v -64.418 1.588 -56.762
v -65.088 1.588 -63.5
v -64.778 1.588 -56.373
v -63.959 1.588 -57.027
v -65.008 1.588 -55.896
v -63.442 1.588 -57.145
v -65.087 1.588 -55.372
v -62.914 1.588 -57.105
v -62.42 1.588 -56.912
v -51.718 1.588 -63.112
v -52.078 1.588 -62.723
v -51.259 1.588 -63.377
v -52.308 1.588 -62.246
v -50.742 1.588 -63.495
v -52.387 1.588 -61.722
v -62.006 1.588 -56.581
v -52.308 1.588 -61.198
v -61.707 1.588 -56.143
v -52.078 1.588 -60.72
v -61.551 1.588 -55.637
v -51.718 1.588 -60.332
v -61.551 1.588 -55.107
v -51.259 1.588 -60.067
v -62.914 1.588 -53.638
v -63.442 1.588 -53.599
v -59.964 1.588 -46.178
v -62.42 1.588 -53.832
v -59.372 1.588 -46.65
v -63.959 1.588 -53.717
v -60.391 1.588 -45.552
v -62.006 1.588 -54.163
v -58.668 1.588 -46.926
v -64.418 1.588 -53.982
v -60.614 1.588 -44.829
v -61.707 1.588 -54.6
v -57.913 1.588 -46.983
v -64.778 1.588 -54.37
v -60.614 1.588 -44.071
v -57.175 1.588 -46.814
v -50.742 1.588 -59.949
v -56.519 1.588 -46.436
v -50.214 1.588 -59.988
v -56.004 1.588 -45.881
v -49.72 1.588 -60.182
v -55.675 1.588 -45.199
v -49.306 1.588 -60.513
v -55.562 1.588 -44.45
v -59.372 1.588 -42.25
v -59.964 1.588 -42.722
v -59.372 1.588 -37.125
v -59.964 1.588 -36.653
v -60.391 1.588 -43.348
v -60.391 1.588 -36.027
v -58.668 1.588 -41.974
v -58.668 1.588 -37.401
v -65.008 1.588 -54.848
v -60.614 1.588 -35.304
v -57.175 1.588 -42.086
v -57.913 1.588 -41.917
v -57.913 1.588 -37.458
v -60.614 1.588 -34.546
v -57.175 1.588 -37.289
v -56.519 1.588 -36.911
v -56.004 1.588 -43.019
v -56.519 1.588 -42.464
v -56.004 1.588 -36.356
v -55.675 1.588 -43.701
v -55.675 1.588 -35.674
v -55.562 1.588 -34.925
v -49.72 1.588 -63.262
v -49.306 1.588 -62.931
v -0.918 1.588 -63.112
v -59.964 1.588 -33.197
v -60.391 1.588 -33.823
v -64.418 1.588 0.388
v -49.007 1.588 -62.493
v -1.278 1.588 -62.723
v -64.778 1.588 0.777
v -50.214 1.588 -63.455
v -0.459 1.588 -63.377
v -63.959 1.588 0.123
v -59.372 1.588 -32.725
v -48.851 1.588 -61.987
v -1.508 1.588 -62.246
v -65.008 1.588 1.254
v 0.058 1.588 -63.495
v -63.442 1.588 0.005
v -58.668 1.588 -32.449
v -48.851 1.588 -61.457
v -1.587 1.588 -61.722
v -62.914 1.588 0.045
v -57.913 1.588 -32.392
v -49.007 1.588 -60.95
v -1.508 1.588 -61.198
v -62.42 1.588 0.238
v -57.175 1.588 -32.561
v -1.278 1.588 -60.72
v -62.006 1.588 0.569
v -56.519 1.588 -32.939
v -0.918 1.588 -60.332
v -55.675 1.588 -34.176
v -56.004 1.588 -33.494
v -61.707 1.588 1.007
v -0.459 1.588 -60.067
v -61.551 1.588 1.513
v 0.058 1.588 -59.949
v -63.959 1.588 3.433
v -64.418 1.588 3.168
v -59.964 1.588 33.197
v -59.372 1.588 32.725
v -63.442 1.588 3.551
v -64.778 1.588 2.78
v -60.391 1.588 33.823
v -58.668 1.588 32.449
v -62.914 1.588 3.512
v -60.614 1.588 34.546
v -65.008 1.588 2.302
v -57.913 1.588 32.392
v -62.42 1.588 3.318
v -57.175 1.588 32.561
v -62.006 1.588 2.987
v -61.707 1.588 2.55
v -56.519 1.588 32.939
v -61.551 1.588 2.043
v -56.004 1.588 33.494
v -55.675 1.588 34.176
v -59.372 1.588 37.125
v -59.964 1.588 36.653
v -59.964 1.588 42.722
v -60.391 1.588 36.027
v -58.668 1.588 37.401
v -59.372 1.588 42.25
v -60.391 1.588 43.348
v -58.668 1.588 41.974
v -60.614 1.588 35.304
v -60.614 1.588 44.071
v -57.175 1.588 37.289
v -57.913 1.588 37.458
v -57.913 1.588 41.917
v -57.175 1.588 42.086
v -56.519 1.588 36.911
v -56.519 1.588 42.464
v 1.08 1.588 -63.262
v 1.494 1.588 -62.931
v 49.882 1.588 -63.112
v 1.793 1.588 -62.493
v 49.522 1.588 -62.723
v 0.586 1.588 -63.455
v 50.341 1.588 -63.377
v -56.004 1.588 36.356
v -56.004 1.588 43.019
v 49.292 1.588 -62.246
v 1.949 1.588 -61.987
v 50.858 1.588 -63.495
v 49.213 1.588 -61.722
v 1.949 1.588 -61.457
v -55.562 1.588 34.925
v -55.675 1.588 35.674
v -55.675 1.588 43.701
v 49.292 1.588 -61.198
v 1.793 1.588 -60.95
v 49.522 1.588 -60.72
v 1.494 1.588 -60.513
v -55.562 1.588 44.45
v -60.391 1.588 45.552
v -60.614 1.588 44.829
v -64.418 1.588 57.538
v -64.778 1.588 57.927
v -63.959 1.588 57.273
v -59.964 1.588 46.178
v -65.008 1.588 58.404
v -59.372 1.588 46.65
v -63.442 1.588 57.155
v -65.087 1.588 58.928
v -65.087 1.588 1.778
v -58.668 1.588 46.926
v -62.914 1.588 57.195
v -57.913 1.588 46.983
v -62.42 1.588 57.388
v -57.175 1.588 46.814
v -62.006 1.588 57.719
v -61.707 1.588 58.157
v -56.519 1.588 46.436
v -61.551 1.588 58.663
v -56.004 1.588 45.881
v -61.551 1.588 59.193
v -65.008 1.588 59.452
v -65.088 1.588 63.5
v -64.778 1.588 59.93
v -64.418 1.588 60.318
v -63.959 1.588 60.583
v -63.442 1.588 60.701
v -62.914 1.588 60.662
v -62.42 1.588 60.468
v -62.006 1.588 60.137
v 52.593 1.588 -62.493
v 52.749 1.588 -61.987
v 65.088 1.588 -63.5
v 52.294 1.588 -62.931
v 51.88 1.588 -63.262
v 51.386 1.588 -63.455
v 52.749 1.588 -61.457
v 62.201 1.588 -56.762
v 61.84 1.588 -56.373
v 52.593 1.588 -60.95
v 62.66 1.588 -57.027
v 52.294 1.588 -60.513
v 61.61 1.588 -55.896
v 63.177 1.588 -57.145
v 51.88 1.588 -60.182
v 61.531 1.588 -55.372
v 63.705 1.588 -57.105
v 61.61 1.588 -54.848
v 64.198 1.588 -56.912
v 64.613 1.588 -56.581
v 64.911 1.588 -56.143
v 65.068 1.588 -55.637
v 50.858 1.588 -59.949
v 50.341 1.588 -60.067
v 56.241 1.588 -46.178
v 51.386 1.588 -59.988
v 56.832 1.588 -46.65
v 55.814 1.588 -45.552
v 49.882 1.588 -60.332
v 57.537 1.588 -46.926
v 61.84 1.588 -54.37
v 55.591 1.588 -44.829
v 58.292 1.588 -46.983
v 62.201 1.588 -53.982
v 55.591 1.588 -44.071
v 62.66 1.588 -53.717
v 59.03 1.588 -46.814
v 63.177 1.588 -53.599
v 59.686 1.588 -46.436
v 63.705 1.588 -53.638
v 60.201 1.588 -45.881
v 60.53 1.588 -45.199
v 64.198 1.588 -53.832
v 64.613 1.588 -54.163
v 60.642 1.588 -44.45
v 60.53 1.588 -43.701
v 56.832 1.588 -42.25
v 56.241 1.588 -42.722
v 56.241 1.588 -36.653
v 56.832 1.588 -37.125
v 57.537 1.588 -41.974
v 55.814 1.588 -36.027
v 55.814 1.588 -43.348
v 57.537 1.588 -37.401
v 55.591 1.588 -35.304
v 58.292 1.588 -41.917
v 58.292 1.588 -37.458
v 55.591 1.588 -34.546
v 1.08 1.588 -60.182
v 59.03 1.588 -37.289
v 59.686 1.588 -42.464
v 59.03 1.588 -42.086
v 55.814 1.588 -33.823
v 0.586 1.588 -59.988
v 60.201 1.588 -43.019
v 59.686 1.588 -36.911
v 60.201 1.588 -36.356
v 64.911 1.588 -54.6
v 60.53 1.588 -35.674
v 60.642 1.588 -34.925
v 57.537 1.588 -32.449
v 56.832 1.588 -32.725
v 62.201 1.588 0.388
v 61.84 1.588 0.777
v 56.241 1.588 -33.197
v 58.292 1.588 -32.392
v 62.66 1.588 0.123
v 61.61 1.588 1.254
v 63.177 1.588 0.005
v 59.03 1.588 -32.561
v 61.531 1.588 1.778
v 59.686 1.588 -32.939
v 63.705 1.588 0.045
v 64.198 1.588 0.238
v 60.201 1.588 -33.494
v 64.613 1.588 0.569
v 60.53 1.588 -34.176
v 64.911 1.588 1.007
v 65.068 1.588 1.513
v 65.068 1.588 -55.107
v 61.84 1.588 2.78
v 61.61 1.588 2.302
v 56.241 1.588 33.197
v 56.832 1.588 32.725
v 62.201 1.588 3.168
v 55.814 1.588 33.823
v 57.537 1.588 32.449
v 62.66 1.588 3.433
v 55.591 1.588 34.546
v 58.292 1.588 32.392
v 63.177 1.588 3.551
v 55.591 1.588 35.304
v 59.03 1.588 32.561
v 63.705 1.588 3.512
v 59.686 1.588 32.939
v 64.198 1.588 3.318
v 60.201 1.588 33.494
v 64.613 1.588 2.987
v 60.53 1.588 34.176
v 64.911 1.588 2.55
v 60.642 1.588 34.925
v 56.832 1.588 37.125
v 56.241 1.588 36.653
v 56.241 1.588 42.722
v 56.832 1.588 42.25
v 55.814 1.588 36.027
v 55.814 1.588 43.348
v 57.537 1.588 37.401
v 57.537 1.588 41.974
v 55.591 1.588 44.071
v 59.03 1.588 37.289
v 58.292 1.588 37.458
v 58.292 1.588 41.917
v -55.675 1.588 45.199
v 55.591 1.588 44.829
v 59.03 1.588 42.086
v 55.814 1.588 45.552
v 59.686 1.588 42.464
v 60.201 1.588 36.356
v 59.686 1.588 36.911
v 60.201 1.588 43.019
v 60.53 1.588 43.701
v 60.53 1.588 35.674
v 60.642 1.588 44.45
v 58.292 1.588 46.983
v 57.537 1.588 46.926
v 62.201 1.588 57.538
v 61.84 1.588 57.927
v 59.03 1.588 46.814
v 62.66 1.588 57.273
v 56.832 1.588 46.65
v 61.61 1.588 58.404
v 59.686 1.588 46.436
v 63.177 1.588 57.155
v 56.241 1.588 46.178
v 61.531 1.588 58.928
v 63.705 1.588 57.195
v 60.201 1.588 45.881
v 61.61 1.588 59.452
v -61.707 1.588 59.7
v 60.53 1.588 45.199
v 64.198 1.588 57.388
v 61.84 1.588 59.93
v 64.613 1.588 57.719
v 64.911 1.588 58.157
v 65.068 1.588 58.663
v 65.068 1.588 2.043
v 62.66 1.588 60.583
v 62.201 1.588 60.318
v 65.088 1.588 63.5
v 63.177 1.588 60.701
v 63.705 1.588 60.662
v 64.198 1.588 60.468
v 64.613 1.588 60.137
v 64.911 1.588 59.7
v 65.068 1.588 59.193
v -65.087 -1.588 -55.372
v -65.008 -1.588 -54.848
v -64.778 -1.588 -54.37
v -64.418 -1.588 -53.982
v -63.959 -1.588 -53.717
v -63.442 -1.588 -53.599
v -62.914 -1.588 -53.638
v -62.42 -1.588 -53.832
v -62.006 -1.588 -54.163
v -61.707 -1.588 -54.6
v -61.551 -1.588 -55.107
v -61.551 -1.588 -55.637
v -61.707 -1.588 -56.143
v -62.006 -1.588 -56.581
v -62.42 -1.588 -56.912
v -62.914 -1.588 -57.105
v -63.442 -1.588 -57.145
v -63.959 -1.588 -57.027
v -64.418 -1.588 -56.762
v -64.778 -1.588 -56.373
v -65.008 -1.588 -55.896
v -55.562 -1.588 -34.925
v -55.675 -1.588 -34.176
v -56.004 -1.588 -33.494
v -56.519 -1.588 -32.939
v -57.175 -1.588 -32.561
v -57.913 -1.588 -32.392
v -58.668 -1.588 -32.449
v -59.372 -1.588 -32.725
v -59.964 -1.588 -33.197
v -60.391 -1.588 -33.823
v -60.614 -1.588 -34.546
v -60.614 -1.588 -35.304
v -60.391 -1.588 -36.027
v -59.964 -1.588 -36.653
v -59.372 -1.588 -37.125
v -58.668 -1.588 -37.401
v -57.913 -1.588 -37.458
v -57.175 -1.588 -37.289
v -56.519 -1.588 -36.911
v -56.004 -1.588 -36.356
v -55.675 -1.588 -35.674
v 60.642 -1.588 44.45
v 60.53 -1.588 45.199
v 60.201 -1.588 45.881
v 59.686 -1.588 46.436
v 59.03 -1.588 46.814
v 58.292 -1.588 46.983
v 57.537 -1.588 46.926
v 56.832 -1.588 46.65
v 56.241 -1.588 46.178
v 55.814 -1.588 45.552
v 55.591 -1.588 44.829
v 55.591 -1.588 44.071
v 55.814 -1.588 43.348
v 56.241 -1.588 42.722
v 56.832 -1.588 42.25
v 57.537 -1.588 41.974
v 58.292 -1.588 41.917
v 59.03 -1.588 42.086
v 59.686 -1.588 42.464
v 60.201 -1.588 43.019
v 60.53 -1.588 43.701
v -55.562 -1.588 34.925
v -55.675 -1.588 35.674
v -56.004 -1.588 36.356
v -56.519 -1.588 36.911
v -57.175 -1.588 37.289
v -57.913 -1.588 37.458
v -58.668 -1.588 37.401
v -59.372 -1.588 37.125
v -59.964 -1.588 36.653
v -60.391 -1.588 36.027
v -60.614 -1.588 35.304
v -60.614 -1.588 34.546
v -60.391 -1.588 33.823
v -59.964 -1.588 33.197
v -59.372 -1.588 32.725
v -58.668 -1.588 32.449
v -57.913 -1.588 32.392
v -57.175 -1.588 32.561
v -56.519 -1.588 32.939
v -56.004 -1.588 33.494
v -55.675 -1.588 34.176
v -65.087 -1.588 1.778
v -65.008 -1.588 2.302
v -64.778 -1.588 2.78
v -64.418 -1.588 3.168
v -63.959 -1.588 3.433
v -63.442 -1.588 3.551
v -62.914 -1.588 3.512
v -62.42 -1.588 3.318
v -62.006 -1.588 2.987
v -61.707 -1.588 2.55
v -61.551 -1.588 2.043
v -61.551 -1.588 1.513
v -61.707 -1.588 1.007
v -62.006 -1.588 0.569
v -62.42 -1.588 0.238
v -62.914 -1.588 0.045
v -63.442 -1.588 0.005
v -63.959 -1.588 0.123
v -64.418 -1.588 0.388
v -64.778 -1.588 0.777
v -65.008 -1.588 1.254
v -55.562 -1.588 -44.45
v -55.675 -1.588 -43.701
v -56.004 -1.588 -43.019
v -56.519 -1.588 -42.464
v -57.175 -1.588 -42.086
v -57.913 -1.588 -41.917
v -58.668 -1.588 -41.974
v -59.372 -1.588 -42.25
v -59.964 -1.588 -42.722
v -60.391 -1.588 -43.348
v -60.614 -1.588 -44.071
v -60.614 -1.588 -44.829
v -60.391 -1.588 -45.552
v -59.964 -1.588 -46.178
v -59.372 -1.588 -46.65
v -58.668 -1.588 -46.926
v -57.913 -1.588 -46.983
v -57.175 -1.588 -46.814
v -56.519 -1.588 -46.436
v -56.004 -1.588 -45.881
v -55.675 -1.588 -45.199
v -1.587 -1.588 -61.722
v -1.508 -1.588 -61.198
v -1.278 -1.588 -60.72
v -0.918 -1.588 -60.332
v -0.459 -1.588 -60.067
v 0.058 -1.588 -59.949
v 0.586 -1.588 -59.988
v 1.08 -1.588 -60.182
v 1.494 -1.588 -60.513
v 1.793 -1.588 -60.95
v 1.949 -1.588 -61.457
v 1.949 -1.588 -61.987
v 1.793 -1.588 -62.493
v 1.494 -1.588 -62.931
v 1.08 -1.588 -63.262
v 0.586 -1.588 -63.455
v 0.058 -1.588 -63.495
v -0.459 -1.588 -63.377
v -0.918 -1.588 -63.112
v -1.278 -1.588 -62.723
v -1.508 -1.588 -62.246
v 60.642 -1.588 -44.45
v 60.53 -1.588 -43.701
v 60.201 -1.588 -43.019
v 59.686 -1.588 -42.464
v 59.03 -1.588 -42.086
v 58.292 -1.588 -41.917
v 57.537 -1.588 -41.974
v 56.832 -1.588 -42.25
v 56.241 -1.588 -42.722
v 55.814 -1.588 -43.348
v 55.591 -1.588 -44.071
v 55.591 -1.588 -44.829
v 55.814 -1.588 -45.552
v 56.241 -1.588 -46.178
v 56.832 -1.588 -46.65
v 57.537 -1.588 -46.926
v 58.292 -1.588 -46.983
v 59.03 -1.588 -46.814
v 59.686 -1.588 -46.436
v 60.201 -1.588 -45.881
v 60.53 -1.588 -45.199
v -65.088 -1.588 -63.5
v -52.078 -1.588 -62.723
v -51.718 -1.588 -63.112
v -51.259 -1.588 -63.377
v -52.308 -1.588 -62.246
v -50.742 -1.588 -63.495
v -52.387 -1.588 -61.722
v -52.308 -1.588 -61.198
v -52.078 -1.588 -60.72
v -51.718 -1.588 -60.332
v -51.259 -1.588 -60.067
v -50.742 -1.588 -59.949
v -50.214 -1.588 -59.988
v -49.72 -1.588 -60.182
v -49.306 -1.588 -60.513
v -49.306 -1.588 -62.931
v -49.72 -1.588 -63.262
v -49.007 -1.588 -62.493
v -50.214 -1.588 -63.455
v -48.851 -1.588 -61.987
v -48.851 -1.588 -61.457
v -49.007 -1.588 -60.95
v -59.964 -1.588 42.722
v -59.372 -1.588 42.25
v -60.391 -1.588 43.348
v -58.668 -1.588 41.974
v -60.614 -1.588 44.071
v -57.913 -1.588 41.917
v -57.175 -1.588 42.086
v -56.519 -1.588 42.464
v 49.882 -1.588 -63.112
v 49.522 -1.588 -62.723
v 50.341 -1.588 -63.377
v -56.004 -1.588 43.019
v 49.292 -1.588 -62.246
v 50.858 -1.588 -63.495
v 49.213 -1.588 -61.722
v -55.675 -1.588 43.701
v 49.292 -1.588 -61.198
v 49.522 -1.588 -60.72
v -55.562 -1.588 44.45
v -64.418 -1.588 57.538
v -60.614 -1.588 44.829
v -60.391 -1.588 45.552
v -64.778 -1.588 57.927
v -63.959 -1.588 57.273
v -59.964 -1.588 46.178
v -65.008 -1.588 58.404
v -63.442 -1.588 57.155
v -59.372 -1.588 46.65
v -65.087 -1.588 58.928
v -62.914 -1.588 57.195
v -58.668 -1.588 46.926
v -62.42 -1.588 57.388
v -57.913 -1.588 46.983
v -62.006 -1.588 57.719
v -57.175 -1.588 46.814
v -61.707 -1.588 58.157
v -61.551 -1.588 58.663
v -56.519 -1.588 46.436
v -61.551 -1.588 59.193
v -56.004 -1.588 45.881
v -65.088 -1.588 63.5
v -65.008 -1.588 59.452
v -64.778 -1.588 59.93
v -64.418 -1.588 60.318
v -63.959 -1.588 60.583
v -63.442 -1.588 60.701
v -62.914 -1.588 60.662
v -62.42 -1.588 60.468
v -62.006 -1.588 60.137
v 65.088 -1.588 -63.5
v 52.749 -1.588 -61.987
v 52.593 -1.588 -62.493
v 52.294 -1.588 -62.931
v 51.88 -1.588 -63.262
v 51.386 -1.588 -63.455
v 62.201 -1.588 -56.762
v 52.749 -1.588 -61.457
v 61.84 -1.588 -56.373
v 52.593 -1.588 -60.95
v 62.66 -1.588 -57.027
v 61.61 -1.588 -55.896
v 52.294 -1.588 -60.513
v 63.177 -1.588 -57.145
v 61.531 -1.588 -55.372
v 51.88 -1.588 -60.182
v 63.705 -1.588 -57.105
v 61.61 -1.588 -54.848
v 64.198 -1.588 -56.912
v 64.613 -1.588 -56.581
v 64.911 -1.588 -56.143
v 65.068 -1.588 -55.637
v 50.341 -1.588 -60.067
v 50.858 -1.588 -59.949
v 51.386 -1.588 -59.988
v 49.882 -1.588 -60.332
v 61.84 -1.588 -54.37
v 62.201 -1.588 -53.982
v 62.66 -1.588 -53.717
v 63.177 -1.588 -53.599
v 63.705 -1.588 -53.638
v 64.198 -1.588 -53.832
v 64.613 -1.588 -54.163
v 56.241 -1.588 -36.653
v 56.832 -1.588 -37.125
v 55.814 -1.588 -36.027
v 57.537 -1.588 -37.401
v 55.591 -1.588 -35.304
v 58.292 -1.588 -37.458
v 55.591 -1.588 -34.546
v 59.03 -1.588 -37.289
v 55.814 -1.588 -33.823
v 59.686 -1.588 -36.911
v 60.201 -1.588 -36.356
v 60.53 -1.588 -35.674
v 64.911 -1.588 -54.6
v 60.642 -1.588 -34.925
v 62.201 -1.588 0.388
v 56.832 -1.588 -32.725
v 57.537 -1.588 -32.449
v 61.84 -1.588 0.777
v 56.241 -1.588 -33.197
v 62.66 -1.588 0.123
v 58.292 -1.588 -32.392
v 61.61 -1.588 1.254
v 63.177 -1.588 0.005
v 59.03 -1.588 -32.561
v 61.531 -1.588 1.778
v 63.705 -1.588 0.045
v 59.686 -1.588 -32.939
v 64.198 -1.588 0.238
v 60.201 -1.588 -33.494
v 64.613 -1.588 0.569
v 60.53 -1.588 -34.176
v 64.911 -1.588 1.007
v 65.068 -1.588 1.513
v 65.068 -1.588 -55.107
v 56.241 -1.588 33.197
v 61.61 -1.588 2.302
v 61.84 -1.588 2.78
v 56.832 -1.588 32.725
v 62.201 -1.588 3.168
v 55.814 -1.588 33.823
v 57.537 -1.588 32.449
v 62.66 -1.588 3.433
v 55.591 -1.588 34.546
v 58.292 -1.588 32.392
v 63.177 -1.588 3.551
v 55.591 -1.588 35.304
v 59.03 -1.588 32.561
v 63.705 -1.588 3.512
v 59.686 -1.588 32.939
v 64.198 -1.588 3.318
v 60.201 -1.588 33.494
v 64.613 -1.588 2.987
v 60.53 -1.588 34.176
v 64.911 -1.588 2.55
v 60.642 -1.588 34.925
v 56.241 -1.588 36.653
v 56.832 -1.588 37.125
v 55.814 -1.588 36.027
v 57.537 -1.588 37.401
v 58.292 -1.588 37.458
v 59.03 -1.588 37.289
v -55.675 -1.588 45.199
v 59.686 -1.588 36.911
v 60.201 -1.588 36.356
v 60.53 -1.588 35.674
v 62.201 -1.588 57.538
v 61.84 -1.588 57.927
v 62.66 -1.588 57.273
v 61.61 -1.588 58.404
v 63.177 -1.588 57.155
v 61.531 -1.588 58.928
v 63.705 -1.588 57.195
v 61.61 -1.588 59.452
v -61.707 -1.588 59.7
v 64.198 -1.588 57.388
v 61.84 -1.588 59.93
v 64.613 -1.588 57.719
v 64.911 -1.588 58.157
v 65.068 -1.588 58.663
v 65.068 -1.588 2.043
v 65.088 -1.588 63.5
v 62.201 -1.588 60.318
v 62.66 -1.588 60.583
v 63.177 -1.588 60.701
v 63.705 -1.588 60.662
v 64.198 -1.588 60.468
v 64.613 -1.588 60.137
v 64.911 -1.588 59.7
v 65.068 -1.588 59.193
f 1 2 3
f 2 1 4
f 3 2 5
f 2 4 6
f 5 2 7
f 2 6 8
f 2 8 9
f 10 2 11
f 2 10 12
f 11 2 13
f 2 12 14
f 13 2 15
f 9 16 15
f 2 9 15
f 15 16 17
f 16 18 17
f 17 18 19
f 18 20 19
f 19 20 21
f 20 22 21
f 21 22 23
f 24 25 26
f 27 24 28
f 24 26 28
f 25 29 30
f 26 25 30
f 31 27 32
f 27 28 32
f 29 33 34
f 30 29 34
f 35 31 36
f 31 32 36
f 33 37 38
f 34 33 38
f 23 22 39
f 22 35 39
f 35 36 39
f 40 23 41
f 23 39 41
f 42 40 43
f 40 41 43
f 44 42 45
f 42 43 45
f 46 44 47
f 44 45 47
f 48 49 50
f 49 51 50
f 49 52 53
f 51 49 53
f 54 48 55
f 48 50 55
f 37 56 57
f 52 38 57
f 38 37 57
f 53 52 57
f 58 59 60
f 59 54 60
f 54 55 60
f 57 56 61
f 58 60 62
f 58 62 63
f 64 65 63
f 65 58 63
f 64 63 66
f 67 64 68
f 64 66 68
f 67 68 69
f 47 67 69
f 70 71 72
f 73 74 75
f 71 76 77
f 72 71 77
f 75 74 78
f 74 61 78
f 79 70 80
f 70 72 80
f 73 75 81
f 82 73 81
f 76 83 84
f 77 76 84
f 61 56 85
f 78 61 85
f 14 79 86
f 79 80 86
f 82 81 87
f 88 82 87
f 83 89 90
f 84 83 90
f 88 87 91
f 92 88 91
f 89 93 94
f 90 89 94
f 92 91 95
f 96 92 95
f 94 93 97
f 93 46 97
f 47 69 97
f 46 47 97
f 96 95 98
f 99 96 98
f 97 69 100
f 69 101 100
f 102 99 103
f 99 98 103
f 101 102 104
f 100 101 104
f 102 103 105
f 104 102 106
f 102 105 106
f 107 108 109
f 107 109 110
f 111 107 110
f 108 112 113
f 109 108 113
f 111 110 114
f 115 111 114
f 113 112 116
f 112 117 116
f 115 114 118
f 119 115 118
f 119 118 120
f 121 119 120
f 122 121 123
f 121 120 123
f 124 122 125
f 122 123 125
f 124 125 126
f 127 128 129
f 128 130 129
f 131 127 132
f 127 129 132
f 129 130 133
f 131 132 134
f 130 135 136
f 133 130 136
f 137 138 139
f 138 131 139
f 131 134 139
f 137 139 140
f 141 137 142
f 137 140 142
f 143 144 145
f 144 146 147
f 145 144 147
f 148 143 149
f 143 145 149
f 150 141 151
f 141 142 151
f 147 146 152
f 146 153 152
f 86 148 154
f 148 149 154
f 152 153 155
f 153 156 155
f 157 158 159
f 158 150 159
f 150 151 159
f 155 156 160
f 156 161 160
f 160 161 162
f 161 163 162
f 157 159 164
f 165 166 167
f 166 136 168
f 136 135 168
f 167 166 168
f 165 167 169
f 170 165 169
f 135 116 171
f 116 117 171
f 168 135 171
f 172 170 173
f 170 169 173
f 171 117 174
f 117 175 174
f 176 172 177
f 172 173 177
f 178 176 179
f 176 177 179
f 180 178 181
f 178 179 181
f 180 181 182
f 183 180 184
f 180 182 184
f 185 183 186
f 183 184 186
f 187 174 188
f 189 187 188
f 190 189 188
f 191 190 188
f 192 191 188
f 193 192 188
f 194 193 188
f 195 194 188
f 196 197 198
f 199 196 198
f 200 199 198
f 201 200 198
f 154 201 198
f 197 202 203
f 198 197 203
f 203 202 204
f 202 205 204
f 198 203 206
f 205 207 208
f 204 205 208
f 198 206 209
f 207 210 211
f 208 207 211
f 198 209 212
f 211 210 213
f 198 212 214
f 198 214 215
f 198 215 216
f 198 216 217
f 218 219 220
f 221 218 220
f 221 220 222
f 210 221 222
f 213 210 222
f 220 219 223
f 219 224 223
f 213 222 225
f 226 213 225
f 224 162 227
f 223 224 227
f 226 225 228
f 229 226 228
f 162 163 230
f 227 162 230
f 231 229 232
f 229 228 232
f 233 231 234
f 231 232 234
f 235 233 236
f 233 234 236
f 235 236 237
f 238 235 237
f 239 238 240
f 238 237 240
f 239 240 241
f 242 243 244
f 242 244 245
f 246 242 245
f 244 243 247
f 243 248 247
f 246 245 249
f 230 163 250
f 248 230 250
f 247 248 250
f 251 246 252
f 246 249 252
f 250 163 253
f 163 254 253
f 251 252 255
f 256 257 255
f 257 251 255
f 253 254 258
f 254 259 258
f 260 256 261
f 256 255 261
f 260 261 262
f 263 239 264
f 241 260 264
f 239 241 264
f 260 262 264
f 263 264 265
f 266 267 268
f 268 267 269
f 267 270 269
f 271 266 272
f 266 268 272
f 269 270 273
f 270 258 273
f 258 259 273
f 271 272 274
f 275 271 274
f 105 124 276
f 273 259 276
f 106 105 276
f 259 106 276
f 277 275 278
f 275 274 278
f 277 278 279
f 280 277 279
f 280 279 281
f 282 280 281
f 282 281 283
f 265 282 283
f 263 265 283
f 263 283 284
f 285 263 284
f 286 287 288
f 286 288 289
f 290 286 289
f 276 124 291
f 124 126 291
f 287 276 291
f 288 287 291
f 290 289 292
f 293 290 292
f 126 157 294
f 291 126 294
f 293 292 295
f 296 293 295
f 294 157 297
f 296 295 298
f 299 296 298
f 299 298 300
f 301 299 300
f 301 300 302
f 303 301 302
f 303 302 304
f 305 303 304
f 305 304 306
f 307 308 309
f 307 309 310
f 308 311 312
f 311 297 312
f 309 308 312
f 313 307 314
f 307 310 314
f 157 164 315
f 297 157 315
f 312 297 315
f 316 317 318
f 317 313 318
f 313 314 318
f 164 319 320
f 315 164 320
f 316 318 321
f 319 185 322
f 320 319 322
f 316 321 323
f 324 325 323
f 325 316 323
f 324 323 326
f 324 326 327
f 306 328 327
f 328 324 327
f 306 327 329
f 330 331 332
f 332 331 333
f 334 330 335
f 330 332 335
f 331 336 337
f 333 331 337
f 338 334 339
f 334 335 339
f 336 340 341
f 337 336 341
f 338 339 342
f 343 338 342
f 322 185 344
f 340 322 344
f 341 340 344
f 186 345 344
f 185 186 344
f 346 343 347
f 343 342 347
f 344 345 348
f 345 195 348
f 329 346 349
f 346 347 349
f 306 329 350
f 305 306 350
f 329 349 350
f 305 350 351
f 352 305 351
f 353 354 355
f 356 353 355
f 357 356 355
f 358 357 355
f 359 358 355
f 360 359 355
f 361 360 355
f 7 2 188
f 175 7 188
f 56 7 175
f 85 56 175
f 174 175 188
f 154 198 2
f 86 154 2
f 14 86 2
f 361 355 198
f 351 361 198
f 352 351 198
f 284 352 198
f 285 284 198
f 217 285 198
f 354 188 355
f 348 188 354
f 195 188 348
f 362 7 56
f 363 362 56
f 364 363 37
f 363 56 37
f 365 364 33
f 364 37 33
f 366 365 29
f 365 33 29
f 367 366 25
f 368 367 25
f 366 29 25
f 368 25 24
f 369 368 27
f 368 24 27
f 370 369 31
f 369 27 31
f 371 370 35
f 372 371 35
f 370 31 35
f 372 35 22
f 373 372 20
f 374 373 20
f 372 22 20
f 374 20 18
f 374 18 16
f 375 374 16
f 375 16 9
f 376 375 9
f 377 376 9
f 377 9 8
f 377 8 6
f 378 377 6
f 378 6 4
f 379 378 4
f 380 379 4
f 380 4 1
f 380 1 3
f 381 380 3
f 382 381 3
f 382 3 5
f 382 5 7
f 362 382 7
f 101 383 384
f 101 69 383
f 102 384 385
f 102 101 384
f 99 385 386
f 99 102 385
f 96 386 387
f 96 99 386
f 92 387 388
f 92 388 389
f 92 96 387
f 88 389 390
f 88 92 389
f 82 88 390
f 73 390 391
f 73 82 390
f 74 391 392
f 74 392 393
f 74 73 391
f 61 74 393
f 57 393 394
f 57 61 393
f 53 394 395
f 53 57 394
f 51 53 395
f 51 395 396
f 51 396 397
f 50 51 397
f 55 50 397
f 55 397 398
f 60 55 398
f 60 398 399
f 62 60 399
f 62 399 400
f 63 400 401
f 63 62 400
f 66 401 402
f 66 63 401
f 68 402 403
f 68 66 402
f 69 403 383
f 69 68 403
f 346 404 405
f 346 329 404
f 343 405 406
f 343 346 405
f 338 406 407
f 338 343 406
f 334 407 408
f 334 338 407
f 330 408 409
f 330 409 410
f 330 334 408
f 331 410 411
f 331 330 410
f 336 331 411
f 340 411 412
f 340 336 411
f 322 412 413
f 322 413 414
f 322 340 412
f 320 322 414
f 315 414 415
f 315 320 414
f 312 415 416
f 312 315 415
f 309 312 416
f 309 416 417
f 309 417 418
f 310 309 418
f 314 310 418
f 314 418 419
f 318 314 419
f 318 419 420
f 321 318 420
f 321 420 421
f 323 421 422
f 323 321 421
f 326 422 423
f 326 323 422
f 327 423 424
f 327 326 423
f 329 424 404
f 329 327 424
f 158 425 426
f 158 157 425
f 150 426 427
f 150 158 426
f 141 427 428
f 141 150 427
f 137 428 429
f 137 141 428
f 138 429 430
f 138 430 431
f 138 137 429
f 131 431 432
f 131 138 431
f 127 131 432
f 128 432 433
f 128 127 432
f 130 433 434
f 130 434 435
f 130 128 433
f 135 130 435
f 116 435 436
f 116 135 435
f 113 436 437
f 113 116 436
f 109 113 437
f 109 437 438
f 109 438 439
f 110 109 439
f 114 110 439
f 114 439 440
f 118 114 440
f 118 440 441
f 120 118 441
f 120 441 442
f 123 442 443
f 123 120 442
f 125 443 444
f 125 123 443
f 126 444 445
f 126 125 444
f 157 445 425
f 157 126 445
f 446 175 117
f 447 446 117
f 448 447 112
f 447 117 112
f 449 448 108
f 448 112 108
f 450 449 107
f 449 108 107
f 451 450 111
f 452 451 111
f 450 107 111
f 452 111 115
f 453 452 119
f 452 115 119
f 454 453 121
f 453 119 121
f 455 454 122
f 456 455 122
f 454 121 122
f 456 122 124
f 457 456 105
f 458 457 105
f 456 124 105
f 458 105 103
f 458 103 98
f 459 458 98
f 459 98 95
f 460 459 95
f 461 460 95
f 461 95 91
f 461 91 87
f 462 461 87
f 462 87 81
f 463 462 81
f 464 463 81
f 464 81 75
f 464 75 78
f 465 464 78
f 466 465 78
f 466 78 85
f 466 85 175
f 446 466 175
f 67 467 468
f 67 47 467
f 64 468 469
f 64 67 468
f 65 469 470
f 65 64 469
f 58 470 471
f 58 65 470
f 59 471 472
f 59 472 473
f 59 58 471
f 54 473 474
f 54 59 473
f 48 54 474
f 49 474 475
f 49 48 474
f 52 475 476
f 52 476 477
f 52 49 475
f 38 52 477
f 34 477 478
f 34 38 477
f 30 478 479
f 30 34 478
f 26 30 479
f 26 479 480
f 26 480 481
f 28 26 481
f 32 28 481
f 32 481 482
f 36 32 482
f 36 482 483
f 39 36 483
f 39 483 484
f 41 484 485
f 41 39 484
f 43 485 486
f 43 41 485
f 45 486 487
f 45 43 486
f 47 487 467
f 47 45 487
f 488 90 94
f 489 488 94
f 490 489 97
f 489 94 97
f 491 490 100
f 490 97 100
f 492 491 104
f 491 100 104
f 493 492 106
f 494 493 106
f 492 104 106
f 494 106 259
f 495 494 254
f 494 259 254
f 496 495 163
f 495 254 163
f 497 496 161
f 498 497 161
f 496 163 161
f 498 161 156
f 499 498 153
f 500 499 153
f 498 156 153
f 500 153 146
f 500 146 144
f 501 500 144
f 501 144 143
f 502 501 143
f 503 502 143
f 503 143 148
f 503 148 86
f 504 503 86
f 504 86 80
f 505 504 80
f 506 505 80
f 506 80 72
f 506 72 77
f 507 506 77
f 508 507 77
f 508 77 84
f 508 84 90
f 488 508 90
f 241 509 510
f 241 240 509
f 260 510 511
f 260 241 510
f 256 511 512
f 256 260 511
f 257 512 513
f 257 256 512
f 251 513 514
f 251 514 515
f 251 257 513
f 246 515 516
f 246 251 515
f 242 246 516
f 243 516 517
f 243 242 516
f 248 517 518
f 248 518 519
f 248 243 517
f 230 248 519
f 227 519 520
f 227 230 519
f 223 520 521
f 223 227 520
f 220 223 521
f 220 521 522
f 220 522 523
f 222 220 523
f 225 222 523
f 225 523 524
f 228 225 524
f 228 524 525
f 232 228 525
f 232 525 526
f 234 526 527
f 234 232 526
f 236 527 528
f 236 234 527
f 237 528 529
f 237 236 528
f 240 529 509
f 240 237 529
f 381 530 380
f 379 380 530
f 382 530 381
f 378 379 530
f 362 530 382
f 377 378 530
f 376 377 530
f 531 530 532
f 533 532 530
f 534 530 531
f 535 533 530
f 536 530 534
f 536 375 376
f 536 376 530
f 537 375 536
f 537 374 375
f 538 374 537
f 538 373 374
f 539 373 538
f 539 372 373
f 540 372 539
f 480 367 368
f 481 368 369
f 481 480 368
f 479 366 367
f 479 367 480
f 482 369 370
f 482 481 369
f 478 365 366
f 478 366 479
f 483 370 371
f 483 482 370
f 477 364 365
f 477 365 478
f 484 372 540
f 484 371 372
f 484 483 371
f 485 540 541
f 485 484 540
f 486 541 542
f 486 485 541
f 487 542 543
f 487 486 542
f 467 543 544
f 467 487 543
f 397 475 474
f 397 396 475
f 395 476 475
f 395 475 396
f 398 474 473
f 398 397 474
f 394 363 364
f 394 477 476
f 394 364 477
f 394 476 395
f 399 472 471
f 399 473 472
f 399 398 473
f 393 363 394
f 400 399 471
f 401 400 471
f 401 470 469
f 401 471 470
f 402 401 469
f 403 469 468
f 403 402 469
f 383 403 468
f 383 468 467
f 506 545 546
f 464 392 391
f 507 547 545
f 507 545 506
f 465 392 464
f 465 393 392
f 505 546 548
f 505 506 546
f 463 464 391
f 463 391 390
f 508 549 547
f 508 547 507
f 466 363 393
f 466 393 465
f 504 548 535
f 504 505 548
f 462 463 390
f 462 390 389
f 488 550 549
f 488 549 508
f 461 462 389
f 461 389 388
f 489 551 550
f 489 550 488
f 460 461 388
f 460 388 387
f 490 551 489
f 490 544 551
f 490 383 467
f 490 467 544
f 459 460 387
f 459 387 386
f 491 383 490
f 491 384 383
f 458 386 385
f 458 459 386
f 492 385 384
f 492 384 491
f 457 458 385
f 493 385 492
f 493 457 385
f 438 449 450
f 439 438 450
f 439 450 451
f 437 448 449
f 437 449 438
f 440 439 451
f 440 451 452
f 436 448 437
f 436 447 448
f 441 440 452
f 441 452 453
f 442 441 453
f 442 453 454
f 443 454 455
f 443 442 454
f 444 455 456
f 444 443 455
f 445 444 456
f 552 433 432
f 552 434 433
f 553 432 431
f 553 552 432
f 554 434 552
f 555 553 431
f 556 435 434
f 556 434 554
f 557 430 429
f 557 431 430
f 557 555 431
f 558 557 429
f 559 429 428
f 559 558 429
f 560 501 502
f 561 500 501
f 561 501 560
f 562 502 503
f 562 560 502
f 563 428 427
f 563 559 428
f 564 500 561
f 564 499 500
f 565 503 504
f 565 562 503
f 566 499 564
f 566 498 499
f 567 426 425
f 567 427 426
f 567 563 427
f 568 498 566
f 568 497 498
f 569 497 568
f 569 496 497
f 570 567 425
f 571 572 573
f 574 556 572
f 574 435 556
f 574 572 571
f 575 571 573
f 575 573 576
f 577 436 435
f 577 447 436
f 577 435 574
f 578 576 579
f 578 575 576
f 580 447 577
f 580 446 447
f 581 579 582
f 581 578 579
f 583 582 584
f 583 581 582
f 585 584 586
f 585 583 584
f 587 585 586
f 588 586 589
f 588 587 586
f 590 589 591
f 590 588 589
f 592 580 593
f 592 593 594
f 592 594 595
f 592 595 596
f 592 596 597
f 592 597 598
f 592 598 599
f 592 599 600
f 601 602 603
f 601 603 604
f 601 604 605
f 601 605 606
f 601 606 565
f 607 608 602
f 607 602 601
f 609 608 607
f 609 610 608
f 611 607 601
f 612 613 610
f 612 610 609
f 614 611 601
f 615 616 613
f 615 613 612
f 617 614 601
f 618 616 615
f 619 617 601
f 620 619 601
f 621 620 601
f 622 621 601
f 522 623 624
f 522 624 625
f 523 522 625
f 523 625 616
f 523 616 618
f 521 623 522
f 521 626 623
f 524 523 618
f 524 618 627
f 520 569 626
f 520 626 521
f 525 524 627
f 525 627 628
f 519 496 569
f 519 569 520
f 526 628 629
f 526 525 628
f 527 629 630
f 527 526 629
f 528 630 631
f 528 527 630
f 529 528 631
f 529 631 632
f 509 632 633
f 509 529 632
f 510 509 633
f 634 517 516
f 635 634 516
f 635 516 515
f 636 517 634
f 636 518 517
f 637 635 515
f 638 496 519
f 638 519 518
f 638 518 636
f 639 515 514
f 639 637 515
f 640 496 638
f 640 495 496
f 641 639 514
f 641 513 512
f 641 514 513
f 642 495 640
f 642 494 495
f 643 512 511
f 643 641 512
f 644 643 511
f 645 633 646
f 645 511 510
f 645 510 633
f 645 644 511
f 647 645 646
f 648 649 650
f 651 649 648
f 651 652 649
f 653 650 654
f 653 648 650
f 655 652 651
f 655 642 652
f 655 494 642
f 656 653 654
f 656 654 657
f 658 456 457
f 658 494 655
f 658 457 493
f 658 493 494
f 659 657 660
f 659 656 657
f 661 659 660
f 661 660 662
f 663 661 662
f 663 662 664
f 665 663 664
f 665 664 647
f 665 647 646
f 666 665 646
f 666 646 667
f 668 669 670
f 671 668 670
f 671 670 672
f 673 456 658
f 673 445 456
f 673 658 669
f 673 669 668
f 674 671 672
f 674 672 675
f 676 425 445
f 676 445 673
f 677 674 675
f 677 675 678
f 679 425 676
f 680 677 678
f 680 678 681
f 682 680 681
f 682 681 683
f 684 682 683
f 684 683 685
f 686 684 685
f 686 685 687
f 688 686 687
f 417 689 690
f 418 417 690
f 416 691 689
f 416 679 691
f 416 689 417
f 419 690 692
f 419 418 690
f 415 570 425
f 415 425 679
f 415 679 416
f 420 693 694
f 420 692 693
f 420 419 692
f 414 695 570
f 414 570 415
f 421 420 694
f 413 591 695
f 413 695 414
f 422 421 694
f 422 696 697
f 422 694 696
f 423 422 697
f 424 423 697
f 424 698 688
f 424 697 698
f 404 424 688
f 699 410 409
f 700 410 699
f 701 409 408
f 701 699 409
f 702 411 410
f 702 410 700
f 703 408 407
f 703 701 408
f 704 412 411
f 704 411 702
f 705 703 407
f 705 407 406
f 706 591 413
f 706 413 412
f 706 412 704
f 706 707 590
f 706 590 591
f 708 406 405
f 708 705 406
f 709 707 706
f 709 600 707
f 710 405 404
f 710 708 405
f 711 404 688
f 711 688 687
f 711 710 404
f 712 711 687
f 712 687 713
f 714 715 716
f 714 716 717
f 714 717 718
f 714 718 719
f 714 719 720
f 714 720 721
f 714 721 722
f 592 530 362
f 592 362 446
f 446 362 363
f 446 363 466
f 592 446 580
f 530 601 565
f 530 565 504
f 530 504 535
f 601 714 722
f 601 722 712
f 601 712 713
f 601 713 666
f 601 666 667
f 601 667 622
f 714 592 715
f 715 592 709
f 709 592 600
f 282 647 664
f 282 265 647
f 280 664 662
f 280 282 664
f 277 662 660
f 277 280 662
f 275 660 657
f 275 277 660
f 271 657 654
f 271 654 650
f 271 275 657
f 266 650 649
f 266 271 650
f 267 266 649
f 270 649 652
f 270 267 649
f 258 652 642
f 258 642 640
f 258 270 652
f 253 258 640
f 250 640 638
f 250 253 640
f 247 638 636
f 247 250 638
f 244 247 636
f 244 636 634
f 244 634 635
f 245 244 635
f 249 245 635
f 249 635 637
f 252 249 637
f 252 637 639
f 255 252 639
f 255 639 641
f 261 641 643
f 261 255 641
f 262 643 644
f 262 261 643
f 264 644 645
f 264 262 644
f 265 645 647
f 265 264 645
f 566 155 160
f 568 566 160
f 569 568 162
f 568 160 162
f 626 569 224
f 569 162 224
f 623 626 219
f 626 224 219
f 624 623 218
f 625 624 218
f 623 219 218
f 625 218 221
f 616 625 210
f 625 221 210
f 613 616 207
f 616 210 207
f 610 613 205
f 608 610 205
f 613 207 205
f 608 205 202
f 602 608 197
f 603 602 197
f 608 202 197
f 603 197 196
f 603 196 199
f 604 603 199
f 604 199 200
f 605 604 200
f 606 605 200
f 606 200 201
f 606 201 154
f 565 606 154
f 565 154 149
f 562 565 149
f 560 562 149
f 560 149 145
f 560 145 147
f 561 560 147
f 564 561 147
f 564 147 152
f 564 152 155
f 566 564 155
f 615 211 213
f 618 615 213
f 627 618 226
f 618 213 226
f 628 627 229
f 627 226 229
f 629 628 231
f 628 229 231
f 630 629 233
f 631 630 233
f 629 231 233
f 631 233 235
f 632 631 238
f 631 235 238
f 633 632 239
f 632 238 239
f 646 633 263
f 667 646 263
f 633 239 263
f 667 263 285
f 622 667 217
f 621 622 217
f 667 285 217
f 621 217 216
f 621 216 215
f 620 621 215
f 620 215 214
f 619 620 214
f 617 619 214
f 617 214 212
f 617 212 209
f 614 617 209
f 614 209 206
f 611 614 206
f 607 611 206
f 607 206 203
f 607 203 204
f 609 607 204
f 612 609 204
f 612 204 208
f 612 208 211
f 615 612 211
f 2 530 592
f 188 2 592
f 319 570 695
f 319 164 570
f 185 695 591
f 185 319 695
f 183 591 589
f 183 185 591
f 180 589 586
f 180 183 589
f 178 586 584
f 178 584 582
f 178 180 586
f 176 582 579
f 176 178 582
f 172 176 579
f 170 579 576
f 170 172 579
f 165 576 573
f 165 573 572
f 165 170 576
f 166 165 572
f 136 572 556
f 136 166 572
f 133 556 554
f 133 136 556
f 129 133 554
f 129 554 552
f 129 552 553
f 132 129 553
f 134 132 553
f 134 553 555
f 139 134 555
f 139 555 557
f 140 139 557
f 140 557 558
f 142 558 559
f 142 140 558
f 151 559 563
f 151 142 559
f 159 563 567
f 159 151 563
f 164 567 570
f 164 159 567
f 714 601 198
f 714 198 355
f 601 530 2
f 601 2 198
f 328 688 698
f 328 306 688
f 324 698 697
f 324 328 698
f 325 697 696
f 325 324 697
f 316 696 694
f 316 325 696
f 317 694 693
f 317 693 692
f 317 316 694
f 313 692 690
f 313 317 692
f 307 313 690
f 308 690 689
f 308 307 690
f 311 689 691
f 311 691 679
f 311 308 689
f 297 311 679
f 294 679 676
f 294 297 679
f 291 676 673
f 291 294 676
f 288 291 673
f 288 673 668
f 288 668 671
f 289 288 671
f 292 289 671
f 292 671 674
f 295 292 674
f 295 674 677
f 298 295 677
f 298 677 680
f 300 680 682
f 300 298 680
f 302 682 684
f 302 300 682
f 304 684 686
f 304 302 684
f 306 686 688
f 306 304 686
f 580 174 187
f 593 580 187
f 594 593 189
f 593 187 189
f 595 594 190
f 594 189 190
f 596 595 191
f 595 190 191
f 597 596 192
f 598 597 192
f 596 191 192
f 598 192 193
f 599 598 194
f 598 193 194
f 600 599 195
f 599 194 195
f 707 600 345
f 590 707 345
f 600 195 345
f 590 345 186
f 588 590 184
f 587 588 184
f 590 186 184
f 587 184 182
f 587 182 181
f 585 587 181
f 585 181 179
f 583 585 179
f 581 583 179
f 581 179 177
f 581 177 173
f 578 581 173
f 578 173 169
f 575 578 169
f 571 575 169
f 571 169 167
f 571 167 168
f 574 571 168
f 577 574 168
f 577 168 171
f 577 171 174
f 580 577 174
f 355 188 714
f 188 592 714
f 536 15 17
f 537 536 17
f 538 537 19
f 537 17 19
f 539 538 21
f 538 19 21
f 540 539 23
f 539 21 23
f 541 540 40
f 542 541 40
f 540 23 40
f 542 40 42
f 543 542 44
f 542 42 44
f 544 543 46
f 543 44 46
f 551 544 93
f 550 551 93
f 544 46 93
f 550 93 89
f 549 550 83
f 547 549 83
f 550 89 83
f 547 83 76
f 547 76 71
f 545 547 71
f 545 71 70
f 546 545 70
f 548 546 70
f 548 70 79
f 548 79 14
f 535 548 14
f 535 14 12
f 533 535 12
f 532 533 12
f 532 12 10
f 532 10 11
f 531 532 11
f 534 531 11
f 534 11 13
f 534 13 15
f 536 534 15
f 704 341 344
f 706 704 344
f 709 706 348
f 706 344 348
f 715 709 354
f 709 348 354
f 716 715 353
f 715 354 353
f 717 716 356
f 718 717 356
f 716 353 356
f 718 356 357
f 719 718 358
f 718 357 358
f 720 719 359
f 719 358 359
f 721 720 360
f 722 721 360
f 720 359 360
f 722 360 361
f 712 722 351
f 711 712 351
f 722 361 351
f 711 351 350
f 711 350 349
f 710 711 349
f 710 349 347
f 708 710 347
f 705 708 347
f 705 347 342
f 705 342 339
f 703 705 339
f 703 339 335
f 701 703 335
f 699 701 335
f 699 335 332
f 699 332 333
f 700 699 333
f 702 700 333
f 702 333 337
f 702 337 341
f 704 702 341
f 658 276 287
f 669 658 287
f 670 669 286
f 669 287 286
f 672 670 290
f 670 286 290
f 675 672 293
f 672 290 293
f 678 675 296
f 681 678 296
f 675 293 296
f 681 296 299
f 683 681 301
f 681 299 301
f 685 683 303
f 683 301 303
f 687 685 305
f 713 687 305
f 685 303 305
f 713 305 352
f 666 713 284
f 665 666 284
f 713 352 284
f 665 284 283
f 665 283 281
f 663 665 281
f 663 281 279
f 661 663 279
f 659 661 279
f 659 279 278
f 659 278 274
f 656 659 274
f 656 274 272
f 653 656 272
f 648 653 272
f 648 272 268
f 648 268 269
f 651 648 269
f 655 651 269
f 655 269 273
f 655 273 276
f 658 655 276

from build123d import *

# Parameters (mm, degrees)
F0_W     = 130.175
F0_H     = 127
F0_R     = 2.54
F1_DEPTH = 1.5875
F3_D     = 3.556


with BuildPart() as f1:
    # F0 (on Front) → F1 (new body, symmetric)
    with BuildSketch(Plane.XZ):
        Rectangle(F0_W, F0_H)
        with Locations((-58.1025, -44.45)):
            Circle(F0_R, mode=Mode.SUBTRACT)
        with Locations((-58.1025, -34.925)):
            Circle(F0_R, mode=Mode.SUBTRACT)
        with Locations((58.1025, -44.45)):
            Circle(F0_R, mode=Mode.SUBTRACT)
        with Locations((58.1025, -34.925)):
            Circle(F0_R, mode=Mode.SUBTRACT)
        with Locations((-58.1025, 34.925)):
            Circle(F0_R, mode=Mode.SUBTRACT)
        with Locations((-58.1025, 44.45)):
            Circle(F0_R, mode=Mode.SUBTRACT)
        with Locations((58.1025, 34.925)):
            Circle(F0_R, mode=Mode.SUBTRACT)
        with Locations((58.1025, 44.45)):
            Circle(F0_R, mode=Mode.SUBTRACT)
    extrude(amount=F1_DEPTH, both=True)

    # F3 (through all)
    with Locations(Plane.XZ.offset(1.5875)):
        with Locations((-63.309373, 58.928127), (-63.309373, 1.778127), (-63.309373, -55.371873), (-50.609373, -61.721873), (0.190627, -61.721873), (50.990627, -61.721873), (63.309373, -55.371873), (63.309373, 1.778127), (63.309373, 58.928127)):
            Hole(F3_D / 2)


solid = f1.part
